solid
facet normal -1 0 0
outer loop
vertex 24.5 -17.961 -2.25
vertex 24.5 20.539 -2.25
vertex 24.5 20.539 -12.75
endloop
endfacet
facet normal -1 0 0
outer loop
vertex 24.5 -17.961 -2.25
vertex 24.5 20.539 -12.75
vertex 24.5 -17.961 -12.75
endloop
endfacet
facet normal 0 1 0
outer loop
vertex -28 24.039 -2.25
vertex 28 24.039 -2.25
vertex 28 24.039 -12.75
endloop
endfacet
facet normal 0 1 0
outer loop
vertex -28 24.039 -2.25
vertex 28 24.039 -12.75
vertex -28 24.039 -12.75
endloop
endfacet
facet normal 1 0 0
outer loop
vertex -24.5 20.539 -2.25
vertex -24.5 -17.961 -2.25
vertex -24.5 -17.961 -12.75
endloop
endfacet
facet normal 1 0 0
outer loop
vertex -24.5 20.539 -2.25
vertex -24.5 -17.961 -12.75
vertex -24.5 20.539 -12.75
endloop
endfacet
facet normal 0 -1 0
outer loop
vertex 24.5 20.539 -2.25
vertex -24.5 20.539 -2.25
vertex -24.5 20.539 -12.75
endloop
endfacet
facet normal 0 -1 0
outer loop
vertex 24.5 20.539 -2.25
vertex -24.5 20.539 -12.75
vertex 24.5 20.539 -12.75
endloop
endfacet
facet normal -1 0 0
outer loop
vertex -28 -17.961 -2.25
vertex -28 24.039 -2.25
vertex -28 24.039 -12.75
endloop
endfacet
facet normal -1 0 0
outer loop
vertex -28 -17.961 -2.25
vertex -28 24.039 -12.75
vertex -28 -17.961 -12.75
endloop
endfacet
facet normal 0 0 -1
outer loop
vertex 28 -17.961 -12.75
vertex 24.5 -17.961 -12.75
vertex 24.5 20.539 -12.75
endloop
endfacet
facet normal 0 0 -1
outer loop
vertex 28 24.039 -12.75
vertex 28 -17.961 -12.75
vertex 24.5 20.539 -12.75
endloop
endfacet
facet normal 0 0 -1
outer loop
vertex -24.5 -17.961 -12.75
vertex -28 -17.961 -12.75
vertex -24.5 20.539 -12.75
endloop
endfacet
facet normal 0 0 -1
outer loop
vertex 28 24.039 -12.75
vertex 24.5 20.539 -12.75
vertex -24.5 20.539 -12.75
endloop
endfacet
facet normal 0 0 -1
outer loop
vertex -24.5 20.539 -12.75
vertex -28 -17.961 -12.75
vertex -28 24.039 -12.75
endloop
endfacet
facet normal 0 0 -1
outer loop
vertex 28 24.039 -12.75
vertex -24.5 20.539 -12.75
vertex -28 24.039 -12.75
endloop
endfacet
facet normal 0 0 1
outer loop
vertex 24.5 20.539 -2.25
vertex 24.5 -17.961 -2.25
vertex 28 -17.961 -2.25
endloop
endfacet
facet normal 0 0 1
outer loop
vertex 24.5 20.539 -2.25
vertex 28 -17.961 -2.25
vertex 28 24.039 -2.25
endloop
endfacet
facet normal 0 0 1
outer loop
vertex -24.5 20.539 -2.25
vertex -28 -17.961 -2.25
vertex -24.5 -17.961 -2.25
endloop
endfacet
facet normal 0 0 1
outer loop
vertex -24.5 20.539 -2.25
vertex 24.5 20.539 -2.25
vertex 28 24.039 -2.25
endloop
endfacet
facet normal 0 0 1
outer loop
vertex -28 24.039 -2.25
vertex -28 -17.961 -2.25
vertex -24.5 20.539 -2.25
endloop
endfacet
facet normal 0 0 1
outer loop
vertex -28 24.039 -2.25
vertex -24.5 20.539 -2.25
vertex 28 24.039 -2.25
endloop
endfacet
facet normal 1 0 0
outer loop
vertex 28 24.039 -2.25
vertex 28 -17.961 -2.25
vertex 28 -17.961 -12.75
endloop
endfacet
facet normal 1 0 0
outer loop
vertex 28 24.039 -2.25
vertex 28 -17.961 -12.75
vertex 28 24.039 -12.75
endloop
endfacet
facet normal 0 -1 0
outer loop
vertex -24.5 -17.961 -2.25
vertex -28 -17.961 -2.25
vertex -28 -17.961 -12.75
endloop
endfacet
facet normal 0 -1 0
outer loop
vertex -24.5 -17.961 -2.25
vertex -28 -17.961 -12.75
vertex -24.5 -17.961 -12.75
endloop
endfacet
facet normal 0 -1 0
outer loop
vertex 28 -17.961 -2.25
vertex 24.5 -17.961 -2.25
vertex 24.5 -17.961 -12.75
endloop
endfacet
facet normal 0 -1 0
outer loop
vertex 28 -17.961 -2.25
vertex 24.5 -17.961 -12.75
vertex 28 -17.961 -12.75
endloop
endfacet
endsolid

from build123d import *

# Parameters (mm, degrees)
BOSS_EXTRUDE1_DEPTH = 15
SCALE1_SCALE        = 0.7


with BuildPart() as part:
    # Sketch2 → Boss-Extrude1 (new body)
    with BuildSketch(Plane(origin=(0, 0, 0), x_dir=(0, 1, 0), z_dir=(0, 0, 1))):
        Polygon((-30, -35), (-30, -40), (30, -40), (30, 40), (-30, 40), (-30, 35), (25, 35), (25, -35), align=None)
    extrude(amount=-BOSS_EXTRUDE1_DEPTH)


with BuildPart() as part_1:
    # Scale1: scaled about (0, 10.131578947, -7.5)
    add(part.part.scale(SCALE1_SCALE).moved(Location((0, 3.039473684, -2.25))))


solid = part_1.part
